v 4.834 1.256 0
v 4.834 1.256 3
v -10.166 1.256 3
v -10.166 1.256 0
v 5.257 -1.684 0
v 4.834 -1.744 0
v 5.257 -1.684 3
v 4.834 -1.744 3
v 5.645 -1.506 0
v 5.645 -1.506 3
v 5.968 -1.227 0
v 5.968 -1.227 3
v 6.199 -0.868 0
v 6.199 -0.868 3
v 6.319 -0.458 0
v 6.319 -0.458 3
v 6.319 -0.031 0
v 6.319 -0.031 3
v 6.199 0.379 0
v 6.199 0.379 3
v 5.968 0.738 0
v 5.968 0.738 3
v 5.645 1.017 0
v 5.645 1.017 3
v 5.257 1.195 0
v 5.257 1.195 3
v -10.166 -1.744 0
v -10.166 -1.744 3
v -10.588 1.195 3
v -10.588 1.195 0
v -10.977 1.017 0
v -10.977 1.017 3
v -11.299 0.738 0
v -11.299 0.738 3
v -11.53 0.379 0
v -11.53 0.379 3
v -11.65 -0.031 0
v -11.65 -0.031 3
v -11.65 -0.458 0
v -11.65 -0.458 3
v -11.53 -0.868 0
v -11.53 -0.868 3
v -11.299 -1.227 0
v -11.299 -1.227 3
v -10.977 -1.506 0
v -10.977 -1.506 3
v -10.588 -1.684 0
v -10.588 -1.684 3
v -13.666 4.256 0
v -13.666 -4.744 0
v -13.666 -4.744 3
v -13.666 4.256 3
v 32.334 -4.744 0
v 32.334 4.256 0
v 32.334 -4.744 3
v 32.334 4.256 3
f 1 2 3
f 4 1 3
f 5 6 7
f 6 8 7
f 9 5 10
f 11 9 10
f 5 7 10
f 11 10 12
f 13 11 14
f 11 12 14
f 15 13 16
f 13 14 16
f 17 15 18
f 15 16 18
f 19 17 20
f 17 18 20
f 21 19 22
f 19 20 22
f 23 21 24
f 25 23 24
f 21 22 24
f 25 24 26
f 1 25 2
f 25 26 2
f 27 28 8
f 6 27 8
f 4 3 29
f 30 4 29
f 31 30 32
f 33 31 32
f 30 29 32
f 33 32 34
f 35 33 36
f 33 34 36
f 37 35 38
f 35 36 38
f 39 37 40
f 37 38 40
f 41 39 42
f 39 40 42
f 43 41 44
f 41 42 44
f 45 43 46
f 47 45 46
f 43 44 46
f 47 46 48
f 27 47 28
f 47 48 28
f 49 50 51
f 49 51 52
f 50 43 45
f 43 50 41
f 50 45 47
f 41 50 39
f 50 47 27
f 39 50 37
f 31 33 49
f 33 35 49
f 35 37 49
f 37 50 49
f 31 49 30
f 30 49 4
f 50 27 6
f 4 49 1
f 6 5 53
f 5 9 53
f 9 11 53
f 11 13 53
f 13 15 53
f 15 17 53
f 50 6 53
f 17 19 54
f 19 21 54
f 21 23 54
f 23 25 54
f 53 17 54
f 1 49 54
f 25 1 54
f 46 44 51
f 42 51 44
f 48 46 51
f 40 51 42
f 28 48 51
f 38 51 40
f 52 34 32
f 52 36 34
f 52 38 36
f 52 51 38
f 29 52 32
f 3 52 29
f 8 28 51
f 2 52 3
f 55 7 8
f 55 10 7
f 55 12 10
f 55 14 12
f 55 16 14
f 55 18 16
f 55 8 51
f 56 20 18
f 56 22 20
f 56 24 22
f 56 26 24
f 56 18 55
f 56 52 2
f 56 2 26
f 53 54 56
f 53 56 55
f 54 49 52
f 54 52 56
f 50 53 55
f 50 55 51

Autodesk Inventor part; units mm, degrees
ref_plane "YZ Plane" through (0, 0, 0) normal (1, 0, 0) x (0, 1, 0)
ref_plane "XZ Plane" through (0, 0, 0) normal (0, 1, 0) x (-1, 0, 0)
ref_plane "XY Plane" through (0, 0, 0) normal (0, 0, 1) x (1, 0, 0)
sketch "スケッチ1" plane through (0, 0, 0) normal (0, 0, 1) x (1, 0, 0)
  line L0 (-13.6656, 4.2556) -> (32.3344, 4.2556)
  line L1 (32.3344, 4.2556) -> (32.3344, -4.7444)
  line L2 (32.3344, -4.7444) -> (-13.6656, -4.7444)
  line L3 (-13.6656, -4.7444) -> (-13.6656, 4.2556)
  point P0 (0, 0)
  dimension "d0" = 46
  dimension "d1" = 9
extrude "押し出し1" add sketch "スケッチ1" along normal blind 3
sketch "スケッチ2" plane through (0, 0, 3) normal (0, 0, 1) x (1, 0, 0)
  line L0 (-10.1656, -0.2444) -> (4.8344, -0.2444) construction
  line L1 (-10.1656, -1.7444) -> (4.8344, -1.7444)
  line L2 (4.8344, 1.2556) -> (-10.1656, 1.2556)
  arc A0 (-10.1656, 1.2556) -> (-10.1656, -1.7444) centre (-10.1656, -0.2444) ccw
  arc A1 (4.8344, -1.7444) -> (4.8344, 1.2556) centre (4.8344, -0.2444) ccw
  line L3 (-13.6656, 4.2556) -> (-13.6656, -4.7444) projected
  line L4 (32.3344, 4.2556) -> (-13.6656, 4.2556) projected
  point P0 (0, 0)
  point P1 (-2.6656, -0.2444)
  dimension "d4" = 15
  dimension "d5" = 3
  dimension "d6" = 3.5
  dimension "d7" = 4.5
extrude "押し出し2" cut sketch "スケッチ2" against normal blind 3
equation "\"BendRadius\" = Thickness"
equation "\"BendReliefWidth\" = Thickness"
equation "\"BendReliefDepth\" = 0.5 * Thickness"
equation "\"CornerReliefSize\" = 4 * Thickness"
equation "\"MinimumRemnant\" = 2 * Thickness"
equation "\"TransitionRadius\" = BendRadius"
equation "\"JacobiRadiusSize\" = BendRadius"
equation "\"GapSize\" = Thickness"
equation "\"Thickness\" = 0.5"
properties part number "creat2"
